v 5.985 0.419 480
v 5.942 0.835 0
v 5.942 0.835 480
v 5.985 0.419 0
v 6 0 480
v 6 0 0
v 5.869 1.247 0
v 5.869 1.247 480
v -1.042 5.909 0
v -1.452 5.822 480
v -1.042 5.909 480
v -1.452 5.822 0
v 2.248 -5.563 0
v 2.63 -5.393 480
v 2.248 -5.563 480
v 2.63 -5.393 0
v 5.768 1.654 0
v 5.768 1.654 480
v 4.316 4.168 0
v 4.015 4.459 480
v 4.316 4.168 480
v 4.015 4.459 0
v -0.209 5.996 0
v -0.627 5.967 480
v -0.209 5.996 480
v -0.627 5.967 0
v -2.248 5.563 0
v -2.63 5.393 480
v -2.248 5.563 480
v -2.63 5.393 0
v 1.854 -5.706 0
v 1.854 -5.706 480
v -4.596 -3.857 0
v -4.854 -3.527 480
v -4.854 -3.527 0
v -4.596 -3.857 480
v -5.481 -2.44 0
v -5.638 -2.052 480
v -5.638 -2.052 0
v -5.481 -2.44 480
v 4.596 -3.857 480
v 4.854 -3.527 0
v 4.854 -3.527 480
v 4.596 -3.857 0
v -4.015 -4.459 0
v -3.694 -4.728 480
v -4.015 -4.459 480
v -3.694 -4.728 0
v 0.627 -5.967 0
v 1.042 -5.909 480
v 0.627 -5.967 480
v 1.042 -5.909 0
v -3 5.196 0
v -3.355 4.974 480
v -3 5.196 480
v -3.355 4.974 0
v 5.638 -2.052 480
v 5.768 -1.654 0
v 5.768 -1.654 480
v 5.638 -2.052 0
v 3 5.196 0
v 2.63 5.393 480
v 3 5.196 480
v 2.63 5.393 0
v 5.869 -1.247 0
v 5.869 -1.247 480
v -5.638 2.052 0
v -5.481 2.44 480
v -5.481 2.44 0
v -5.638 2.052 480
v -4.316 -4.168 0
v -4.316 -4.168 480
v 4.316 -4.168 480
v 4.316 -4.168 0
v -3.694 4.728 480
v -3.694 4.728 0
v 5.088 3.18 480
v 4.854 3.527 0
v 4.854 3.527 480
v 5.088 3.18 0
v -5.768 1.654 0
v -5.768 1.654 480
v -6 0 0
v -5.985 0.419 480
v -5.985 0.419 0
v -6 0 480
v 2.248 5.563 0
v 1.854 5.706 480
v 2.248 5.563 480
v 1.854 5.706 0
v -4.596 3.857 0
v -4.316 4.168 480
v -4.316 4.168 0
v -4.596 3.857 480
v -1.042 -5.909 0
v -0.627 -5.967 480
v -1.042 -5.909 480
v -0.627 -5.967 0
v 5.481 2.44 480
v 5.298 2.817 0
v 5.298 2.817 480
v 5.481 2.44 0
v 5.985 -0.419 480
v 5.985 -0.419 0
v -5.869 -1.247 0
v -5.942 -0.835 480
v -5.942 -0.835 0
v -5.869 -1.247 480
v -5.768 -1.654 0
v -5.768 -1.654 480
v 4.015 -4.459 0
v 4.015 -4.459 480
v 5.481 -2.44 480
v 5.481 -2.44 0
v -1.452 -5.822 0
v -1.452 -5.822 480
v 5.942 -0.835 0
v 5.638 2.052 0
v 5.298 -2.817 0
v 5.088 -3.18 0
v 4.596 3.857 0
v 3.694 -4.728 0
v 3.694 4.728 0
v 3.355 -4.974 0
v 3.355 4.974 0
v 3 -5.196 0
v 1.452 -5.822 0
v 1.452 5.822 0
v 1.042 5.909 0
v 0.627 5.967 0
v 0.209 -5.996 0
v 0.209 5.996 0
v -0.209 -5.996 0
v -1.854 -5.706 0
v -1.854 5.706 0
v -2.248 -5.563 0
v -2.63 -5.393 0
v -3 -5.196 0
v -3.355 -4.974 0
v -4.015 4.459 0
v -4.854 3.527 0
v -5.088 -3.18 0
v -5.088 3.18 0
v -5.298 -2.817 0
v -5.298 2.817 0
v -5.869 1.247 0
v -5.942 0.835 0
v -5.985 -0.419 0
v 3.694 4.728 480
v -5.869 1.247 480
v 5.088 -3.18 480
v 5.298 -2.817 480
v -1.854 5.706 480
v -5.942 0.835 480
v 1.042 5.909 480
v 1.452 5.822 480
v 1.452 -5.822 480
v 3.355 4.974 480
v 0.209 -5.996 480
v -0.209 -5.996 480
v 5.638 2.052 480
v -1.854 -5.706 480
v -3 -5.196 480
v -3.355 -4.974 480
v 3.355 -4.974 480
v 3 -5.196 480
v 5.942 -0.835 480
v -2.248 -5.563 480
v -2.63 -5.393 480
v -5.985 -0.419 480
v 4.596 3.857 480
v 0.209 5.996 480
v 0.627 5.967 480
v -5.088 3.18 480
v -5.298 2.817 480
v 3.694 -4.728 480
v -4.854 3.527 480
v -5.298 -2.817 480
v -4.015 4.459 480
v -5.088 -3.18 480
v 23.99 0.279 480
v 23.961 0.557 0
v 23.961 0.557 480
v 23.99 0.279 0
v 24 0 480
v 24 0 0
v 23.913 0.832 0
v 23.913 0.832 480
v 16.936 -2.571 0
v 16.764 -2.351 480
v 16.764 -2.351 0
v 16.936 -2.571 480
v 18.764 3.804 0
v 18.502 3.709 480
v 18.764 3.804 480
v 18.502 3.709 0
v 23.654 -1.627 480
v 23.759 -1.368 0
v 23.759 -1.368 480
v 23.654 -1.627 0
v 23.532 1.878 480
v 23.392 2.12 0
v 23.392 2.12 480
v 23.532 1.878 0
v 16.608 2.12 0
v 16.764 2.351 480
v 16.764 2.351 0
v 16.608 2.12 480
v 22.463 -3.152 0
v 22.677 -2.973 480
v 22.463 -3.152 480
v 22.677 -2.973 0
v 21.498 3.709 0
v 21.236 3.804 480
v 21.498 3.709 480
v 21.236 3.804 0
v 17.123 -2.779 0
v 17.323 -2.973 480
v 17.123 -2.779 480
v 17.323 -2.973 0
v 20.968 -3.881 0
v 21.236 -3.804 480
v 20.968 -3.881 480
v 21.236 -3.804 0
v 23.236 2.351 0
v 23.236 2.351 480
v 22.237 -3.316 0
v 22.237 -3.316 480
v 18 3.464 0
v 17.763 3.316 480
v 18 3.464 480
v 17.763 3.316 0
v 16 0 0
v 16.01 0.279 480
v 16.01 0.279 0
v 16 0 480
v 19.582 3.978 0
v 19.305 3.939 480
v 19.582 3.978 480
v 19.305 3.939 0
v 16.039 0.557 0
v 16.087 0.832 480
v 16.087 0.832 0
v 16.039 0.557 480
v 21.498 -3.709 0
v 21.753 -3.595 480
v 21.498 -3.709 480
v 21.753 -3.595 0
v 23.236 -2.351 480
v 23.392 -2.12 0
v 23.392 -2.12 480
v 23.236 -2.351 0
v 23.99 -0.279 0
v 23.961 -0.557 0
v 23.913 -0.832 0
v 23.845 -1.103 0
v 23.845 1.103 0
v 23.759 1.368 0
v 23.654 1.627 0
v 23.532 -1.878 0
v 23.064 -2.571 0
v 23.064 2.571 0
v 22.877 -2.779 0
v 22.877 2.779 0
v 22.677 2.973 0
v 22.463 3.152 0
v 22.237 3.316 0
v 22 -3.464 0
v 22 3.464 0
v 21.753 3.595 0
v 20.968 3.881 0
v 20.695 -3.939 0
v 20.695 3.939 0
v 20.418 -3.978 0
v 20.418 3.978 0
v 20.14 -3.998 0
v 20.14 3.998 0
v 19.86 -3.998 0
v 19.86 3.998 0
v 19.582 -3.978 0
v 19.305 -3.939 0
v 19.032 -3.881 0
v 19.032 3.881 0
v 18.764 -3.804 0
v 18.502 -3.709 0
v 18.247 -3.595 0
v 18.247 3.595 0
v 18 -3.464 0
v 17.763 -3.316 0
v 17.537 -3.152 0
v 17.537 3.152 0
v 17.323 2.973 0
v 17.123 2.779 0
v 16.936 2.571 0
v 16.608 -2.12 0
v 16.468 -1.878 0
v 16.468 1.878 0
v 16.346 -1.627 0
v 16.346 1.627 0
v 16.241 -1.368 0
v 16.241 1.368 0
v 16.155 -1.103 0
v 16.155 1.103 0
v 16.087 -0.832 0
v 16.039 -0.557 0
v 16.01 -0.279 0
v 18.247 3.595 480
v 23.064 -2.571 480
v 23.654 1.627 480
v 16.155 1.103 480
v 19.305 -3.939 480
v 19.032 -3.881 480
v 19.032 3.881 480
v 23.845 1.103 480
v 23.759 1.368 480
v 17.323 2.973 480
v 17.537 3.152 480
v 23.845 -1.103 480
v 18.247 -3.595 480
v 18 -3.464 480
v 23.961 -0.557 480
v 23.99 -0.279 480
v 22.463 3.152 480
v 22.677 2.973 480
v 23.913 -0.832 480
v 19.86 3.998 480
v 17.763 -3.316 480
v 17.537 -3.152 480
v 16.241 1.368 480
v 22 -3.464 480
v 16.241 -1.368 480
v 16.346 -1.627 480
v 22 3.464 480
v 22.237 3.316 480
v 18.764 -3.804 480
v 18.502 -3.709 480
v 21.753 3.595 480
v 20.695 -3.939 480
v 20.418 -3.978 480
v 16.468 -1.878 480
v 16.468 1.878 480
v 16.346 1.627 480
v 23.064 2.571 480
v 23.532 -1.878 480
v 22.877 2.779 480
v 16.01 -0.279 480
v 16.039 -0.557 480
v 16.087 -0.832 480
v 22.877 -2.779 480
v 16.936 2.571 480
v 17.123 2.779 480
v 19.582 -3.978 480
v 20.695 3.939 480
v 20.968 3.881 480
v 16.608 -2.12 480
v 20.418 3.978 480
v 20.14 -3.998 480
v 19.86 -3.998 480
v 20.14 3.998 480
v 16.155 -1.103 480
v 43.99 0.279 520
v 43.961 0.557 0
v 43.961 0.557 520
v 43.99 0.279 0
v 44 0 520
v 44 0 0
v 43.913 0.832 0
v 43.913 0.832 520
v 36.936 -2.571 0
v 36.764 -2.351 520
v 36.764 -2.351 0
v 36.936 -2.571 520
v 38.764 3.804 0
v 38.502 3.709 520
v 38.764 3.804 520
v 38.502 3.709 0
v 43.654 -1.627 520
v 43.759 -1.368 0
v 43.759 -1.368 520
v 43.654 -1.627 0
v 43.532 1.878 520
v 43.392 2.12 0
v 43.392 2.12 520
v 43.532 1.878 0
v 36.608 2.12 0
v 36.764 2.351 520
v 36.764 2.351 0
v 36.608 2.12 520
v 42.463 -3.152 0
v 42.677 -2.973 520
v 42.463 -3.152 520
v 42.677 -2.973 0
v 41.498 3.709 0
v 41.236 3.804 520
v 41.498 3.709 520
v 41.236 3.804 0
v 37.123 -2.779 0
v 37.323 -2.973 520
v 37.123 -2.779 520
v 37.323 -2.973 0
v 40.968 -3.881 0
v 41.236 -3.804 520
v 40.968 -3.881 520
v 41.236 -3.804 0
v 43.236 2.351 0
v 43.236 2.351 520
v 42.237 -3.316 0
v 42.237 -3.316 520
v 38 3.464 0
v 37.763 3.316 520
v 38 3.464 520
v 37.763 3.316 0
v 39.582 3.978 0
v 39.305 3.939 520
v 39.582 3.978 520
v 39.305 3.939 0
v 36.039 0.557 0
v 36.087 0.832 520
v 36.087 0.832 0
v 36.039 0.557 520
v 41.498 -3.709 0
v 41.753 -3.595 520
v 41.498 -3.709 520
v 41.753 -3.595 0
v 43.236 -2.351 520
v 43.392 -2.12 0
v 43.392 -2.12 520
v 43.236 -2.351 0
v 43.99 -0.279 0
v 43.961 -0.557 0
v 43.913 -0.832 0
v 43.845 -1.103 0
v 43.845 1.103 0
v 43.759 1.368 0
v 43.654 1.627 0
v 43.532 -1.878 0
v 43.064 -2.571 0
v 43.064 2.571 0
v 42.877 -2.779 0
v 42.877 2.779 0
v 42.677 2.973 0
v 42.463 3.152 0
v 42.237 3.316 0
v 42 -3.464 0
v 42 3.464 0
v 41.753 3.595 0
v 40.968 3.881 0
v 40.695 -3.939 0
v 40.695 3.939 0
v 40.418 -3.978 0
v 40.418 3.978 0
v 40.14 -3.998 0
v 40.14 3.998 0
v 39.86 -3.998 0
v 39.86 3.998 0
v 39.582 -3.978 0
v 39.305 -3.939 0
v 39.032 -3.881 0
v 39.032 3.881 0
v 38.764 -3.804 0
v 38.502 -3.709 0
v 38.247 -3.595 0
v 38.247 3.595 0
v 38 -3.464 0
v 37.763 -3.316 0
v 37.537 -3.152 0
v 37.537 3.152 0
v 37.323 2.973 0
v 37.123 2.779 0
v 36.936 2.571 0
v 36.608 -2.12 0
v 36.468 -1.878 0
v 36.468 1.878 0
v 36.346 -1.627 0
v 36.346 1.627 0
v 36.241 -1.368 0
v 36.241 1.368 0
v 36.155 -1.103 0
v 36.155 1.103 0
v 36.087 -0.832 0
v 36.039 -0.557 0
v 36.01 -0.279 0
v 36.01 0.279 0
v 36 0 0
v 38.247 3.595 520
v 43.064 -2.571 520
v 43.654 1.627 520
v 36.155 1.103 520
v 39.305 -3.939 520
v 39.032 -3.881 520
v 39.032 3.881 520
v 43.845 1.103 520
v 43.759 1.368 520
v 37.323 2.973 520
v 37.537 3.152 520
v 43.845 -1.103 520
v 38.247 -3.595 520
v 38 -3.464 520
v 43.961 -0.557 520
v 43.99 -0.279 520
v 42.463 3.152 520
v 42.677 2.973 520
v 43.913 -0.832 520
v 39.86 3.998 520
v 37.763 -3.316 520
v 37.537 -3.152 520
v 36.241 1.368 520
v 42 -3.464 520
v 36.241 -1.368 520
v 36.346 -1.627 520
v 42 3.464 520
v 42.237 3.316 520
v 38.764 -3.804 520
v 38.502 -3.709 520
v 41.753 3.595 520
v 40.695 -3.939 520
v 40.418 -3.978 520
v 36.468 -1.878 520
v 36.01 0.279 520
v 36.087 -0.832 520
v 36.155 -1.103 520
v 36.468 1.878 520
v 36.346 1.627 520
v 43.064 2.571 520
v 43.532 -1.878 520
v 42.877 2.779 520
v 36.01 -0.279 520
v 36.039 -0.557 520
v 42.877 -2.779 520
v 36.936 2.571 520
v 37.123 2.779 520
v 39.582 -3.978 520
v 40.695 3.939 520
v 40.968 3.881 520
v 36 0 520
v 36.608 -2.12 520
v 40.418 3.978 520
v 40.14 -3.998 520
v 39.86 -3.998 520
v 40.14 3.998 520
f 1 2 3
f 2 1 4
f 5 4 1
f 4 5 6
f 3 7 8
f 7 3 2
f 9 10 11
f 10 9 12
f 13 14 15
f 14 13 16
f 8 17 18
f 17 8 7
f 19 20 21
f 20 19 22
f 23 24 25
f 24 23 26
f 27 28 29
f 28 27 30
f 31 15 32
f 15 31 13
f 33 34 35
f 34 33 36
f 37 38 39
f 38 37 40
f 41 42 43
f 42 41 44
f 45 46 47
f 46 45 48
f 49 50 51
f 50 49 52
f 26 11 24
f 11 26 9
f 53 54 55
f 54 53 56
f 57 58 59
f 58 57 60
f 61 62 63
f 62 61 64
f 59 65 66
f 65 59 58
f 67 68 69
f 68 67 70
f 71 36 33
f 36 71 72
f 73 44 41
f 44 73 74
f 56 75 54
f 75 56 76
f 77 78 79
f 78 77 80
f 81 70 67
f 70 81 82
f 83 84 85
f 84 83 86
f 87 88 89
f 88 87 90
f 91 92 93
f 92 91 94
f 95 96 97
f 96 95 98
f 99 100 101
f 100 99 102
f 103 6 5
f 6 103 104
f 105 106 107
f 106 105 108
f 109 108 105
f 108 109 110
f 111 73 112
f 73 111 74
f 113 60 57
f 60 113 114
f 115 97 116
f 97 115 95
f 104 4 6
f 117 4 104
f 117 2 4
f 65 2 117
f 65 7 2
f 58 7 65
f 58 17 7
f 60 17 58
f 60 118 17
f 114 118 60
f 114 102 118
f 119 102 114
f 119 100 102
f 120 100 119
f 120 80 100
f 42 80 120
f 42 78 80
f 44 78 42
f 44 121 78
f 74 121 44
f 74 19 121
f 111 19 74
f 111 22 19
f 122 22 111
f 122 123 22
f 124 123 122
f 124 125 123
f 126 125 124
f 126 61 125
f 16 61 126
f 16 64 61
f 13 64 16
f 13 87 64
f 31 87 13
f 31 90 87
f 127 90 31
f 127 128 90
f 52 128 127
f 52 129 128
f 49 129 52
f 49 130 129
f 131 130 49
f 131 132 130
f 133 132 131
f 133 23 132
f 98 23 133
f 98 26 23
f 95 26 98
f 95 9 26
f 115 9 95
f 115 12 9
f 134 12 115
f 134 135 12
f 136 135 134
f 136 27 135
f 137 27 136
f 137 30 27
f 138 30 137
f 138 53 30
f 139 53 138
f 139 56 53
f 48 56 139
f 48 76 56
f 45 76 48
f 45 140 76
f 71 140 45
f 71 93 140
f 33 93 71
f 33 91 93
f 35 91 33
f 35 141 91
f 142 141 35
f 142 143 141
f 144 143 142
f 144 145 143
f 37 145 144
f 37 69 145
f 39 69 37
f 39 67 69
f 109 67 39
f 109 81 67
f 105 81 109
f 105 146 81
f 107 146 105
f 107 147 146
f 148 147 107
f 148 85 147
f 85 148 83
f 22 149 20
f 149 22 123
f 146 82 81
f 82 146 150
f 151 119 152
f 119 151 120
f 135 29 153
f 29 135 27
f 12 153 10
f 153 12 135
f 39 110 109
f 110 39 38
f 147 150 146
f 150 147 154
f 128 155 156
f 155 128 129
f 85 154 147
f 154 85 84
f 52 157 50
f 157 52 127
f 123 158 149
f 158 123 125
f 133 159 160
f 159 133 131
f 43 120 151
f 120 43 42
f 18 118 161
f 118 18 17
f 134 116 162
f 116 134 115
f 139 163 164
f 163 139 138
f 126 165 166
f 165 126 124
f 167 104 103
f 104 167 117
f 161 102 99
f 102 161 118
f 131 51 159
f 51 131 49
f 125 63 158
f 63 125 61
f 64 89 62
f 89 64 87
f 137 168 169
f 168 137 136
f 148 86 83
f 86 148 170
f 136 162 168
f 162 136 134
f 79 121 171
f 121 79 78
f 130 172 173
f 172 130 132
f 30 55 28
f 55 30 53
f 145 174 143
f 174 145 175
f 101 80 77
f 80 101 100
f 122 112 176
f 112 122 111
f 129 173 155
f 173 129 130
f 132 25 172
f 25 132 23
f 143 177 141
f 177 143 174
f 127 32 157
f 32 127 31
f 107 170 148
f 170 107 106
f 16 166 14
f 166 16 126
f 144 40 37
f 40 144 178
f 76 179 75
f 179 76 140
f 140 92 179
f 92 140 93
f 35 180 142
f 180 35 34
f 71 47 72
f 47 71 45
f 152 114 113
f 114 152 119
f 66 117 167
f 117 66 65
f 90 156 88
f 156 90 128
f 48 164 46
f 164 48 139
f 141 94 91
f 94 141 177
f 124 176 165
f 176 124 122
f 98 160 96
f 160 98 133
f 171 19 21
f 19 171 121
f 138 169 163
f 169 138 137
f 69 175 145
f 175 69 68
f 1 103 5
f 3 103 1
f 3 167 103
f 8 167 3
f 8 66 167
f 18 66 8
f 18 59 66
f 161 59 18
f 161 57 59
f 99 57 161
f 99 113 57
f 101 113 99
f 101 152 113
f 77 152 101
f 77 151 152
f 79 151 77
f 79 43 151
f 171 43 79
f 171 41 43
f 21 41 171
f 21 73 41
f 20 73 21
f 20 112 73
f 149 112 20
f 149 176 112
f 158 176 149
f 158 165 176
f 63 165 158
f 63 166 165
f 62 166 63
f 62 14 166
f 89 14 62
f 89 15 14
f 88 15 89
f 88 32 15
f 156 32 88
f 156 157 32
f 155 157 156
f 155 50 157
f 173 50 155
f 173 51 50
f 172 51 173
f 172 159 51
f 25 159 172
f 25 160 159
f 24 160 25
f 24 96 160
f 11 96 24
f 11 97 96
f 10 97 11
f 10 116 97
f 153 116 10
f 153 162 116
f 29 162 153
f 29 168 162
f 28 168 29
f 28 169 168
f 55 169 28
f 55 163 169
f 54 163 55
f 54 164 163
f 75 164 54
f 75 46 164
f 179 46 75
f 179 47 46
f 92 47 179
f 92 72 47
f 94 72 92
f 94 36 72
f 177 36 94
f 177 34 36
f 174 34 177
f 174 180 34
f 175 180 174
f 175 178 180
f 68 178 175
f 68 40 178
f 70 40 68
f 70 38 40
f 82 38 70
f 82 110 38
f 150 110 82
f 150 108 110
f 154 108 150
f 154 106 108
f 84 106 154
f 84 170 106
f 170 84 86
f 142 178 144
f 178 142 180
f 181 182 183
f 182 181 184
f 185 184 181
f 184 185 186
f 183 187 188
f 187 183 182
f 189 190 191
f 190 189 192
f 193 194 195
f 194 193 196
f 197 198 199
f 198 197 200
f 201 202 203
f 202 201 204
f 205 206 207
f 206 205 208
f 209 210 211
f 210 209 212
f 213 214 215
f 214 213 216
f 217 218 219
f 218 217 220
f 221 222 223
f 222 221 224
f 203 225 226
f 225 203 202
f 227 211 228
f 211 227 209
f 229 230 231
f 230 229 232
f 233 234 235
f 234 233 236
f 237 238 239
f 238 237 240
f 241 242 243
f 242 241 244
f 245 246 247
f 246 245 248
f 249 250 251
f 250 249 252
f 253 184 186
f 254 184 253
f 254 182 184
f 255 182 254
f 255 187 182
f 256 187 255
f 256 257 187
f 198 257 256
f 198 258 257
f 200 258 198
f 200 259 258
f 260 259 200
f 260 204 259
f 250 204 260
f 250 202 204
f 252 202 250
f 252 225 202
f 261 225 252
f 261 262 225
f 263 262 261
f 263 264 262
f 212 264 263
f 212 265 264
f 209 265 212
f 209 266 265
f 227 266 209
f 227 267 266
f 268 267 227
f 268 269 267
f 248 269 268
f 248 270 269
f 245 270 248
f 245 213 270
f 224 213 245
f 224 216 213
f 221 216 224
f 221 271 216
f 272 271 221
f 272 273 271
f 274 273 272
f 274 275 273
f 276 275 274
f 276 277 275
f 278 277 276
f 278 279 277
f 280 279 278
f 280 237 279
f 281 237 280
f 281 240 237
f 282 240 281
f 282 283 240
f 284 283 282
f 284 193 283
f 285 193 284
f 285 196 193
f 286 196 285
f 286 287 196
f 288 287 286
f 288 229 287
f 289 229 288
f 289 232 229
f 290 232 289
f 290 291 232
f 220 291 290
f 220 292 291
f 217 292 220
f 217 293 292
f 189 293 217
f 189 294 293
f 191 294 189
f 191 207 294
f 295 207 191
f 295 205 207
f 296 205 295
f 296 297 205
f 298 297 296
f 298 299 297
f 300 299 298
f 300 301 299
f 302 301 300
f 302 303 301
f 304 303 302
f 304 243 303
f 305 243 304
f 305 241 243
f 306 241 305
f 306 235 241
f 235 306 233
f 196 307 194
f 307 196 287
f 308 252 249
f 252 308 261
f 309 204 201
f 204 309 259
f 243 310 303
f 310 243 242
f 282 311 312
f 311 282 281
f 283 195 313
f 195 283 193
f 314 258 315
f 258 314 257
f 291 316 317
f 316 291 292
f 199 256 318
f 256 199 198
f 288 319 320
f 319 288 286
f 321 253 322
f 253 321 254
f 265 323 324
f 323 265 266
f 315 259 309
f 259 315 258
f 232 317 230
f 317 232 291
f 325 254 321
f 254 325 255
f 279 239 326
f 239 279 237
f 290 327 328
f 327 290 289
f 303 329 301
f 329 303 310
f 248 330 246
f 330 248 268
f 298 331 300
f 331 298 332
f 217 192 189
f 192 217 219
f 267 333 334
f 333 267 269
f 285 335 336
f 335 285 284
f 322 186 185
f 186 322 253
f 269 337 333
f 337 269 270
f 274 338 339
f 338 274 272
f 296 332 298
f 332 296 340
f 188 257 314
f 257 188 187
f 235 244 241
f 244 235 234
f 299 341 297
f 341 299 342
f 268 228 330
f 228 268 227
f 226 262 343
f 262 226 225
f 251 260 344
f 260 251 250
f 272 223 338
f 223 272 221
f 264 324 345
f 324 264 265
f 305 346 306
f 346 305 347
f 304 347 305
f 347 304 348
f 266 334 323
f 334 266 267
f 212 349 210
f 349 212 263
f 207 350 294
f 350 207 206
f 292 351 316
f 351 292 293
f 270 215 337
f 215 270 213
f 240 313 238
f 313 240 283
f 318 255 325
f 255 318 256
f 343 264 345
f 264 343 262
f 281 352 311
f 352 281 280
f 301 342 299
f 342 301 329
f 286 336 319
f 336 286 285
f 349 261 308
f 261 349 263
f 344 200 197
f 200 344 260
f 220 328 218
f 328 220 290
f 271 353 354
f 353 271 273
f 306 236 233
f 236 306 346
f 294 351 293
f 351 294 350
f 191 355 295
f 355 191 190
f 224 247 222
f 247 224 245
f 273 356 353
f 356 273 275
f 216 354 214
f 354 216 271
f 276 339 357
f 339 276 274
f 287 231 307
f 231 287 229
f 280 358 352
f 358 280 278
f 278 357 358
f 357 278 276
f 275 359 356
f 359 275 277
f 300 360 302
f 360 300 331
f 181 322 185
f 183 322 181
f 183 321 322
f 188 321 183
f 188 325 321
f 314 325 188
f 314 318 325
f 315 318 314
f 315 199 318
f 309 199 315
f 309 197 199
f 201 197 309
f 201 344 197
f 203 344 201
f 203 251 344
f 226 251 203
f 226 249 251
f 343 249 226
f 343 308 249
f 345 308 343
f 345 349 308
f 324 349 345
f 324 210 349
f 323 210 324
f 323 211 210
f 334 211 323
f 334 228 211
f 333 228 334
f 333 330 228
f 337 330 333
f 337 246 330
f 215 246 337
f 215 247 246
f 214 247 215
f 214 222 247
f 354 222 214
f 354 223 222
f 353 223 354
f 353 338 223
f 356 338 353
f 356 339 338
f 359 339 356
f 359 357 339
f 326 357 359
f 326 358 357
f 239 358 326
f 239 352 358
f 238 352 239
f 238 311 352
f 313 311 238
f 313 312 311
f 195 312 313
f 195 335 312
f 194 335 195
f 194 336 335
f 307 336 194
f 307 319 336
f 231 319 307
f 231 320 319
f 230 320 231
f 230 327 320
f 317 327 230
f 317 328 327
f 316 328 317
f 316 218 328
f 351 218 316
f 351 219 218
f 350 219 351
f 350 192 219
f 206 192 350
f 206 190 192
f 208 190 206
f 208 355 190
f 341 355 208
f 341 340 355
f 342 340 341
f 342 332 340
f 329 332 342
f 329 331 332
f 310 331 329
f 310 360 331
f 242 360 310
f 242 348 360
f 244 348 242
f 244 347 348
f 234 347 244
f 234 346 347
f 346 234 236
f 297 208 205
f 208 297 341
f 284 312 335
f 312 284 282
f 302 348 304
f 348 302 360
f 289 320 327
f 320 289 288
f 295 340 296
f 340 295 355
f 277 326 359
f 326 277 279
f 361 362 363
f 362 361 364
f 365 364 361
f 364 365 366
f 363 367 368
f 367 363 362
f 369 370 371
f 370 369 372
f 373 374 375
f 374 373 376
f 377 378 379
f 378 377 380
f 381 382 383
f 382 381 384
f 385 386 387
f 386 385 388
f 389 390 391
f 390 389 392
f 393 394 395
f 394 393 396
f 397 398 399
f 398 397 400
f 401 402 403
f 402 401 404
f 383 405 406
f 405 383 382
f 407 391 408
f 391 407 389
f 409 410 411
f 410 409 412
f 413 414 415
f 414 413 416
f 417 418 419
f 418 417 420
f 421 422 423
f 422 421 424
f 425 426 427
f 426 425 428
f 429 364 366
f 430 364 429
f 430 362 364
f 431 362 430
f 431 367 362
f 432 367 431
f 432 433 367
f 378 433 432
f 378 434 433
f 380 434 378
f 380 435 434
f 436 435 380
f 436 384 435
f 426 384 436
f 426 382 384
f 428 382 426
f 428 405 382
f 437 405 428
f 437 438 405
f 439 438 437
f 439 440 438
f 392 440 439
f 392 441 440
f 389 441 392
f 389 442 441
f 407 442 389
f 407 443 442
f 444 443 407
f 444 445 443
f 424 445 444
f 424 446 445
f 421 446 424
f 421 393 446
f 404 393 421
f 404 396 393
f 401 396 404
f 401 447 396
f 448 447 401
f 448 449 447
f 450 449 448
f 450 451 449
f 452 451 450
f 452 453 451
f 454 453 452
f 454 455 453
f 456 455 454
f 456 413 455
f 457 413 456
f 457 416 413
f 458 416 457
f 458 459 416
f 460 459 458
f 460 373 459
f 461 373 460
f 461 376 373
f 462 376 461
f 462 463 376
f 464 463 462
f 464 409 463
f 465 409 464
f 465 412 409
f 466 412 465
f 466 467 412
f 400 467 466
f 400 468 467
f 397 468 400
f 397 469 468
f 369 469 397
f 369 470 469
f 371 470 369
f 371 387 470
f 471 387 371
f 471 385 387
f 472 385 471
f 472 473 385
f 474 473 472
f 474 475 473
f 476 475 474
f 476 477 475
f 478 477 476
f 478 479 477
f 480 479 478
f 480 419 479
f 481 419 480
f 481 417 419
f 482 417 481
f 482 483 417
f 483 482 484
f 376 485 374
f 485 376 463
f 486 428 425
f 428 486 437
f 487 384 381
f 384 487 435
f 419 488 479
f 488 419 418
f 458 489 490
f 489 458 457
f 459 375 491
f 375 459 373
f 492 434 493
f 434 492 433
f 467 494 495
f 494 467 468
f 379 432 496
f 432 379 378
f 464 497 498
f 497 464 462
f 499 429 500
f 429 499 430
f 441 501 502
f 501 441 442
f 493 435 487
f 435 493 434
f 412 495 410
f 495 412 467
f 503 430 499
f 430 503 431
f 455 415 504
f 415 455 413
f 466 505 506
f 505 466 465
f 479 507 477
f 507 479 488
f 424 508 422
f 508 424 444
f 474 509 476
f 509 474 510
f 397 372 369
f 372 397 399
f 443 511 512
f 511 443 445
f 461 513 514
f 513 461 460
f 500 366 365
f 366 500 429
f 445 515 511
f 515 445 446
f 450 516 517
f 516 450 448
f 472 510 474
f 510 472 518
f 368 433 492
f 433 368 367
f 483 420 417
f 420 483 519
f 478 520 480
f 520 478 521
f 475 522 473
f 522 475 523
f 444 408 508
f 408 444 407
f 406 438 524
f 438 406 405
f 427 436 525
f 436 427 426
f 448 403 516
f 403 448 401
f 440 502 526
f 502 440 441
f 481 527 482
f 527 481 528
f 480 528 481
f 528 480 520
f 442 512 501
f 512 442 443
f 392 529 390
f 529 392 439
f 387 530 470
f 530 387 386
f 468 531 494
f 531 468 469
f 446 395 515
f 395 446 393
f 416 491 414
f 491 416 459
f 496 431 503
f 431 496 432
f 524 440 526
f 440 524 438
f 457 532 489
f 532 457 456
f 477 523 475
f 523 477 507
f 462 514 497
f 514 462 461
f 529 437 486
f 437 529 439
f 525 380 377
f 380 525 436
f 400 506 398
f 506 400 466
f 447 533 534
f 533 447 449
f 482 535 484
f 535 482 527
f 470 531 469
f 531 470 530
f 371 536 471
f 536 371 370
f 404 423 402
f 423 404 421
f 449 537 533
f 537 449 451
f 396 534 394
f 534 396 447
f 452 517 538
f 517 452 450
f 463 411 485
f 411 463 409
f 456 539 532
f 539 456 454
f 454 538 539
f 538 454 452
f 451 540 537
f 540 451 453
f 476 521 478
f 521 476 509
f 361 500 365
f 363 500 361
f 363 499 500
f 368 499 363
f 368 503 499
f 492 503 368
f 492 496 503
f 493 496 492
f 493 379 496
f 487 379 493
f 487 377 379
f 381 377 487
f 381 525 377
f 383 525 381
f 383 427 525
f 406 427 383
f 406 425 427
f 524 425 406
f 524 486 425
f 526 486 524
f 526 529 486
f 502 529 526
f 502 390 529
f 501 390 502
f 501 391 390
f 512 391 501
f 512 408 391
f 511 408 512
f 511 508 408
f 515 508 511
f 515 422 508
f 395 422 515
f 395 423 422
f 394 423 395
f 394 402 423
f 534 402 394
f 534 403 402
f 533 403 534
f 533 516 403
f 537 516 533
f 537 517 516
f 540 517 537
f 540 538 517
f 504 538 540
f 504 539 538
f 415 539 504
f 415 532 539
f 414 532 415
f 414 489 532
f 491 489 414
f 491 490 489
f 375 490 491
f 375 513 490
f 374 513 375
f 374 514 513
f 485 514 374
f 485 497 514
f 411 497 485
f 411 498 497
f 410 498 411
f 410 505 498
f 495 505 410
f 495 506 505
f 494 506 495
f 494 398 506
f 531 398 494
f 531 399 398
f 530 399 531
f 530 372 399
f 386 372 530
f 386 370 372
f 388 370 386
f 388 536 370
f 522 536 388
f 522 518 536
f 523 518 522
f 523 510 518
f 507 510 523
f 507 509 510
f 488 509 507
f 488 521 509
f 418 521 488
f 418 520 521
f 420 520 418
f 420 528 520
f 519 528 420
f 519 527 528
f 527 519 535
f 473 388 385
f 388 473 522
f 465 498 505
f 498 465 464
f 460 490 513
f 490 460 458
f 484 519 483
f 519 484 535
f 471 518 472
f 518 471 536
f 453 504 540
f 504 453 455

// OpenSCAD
// file: ../utils.scad
//Utils
include <config.scad>;

module MOV(mov)
{
    translate(mov)
        children();
}

module ROT(rot)
{
    rotate(rot)
        children();
}

module ROT_MOV(rot, mov)
{
    rotate(rot) 
        translate(mov)
            children();
}

module MOV_ROT(mov, rot)
{
    translate(mov)
        rotate(rot) 
            children();
}

function MULT2MV (m, v) = 
[
    m[0][0]*v[0] + m[0][1]*v[1],
    m[1][0]*v[0] + m[1][1]*v[1],
];

function ROTM2(angle) = 
[
    [cos(angle), -sin(angle)],
    [sin(angle), cos(angle)]
];

function X(x) = [x, 0, 0];

function Y(y) = [0, y, 0];

function Z(z) = [0, 0, z];
// file: ../config.scad
// Config
$fn=90;
// SIZE
// FRAME SIZE
FRAME_SZ = [520, 460, 500];
FRAME_X = FRAME_SZ[0];
FRAME_Y = FRAME_SZ[1];
FRAME_Z = FRAME_SZ[2];

// BED SIZE
BED_SZ = [314, 214, 3];
BED_X = BED_SZ[0];
BED_Y = BED_SZ[1];
BED_Z = BED_SZ[2];
GLASS_SZ = [BED_X, BED_Y, 4];
BED_SCREW_D = 3;
BED_SCREW_OFFSET = 5;
// TABLE SIZE
TABLE_SZ = [330, 350, 22];
TABLE_X = TABLE_SZ[0];
TABLE_Y = TABLE_SZ[1];
TABLE_Z = TABLE_SZ[2];
// RODS
TABLE_ROD_H = FRAME_Z-20;
TABLE_ROD_D = 12;
TABLE_ROD_MOUNT_W = 4;
Z_SCREW_H = FRAME_Z-20;
Z_SCREW_D = 8;
Z_SCREW_HOLE = 11;
Z_SCREW_MOUNT_W = 6;
Y_ROD_H = FRAME_X;
Y_ROD_D = 8;
// RAILS
RAIL_X_OFFSET = 30;
RAIL_X = FRAME_X-40-2*RAIL_X_OFFSET;
RAIL_Y = FRAME_Y-40;
RAIL_P = 20;
RAIL_W = 9;
RAIL_H = 6.5;
// CARET
MGN9C_SZ=[28.9,20,8];
MGN9C_X=MGN9C_SZ[0];
MGN9C_Y=MGN9C_SZ[1];
MGN9C_Z=MGN9C_SZ[2];
MGN9C_H=2;
// COLORS
MOTORS_COLOR = "DimGrey";
PROFILE_COLOR = "Silver";
ROD_COLOR = "WhiteSmoke";
BED_COLOR = "Red";
GLASS_COLOR = [0.25, 0.75, 0.75, 0.25];
BRONZE_COLOR = "Goldenrod";
MGN9C_COLOR = "DarkGreen";
// VECTORS
ZERO = [0, 0, 0];
// main file
// Rods
include <../config.scad>
use <../utils.scad>;

TABLE_ROD();
MOV(X(20)) Z_SCREW();
MOV(X(40)) Y_ROD();

module TABLE_ROD(){
    color(ROD_COLOR)
        cylinder(d=TABLE_ROD_D, h=TABLE_ROD_H);
}

module Z_SCREW(){
    color(ROD_COLOR)
        cylinder(d=Z_SCREW_D, h=Z_SCREW_H);
}

module Y_ROD(){
    color(ROD_COLOR)
        cylinder(d=Y_ROD_D, h=Y_ROD_H);
}
